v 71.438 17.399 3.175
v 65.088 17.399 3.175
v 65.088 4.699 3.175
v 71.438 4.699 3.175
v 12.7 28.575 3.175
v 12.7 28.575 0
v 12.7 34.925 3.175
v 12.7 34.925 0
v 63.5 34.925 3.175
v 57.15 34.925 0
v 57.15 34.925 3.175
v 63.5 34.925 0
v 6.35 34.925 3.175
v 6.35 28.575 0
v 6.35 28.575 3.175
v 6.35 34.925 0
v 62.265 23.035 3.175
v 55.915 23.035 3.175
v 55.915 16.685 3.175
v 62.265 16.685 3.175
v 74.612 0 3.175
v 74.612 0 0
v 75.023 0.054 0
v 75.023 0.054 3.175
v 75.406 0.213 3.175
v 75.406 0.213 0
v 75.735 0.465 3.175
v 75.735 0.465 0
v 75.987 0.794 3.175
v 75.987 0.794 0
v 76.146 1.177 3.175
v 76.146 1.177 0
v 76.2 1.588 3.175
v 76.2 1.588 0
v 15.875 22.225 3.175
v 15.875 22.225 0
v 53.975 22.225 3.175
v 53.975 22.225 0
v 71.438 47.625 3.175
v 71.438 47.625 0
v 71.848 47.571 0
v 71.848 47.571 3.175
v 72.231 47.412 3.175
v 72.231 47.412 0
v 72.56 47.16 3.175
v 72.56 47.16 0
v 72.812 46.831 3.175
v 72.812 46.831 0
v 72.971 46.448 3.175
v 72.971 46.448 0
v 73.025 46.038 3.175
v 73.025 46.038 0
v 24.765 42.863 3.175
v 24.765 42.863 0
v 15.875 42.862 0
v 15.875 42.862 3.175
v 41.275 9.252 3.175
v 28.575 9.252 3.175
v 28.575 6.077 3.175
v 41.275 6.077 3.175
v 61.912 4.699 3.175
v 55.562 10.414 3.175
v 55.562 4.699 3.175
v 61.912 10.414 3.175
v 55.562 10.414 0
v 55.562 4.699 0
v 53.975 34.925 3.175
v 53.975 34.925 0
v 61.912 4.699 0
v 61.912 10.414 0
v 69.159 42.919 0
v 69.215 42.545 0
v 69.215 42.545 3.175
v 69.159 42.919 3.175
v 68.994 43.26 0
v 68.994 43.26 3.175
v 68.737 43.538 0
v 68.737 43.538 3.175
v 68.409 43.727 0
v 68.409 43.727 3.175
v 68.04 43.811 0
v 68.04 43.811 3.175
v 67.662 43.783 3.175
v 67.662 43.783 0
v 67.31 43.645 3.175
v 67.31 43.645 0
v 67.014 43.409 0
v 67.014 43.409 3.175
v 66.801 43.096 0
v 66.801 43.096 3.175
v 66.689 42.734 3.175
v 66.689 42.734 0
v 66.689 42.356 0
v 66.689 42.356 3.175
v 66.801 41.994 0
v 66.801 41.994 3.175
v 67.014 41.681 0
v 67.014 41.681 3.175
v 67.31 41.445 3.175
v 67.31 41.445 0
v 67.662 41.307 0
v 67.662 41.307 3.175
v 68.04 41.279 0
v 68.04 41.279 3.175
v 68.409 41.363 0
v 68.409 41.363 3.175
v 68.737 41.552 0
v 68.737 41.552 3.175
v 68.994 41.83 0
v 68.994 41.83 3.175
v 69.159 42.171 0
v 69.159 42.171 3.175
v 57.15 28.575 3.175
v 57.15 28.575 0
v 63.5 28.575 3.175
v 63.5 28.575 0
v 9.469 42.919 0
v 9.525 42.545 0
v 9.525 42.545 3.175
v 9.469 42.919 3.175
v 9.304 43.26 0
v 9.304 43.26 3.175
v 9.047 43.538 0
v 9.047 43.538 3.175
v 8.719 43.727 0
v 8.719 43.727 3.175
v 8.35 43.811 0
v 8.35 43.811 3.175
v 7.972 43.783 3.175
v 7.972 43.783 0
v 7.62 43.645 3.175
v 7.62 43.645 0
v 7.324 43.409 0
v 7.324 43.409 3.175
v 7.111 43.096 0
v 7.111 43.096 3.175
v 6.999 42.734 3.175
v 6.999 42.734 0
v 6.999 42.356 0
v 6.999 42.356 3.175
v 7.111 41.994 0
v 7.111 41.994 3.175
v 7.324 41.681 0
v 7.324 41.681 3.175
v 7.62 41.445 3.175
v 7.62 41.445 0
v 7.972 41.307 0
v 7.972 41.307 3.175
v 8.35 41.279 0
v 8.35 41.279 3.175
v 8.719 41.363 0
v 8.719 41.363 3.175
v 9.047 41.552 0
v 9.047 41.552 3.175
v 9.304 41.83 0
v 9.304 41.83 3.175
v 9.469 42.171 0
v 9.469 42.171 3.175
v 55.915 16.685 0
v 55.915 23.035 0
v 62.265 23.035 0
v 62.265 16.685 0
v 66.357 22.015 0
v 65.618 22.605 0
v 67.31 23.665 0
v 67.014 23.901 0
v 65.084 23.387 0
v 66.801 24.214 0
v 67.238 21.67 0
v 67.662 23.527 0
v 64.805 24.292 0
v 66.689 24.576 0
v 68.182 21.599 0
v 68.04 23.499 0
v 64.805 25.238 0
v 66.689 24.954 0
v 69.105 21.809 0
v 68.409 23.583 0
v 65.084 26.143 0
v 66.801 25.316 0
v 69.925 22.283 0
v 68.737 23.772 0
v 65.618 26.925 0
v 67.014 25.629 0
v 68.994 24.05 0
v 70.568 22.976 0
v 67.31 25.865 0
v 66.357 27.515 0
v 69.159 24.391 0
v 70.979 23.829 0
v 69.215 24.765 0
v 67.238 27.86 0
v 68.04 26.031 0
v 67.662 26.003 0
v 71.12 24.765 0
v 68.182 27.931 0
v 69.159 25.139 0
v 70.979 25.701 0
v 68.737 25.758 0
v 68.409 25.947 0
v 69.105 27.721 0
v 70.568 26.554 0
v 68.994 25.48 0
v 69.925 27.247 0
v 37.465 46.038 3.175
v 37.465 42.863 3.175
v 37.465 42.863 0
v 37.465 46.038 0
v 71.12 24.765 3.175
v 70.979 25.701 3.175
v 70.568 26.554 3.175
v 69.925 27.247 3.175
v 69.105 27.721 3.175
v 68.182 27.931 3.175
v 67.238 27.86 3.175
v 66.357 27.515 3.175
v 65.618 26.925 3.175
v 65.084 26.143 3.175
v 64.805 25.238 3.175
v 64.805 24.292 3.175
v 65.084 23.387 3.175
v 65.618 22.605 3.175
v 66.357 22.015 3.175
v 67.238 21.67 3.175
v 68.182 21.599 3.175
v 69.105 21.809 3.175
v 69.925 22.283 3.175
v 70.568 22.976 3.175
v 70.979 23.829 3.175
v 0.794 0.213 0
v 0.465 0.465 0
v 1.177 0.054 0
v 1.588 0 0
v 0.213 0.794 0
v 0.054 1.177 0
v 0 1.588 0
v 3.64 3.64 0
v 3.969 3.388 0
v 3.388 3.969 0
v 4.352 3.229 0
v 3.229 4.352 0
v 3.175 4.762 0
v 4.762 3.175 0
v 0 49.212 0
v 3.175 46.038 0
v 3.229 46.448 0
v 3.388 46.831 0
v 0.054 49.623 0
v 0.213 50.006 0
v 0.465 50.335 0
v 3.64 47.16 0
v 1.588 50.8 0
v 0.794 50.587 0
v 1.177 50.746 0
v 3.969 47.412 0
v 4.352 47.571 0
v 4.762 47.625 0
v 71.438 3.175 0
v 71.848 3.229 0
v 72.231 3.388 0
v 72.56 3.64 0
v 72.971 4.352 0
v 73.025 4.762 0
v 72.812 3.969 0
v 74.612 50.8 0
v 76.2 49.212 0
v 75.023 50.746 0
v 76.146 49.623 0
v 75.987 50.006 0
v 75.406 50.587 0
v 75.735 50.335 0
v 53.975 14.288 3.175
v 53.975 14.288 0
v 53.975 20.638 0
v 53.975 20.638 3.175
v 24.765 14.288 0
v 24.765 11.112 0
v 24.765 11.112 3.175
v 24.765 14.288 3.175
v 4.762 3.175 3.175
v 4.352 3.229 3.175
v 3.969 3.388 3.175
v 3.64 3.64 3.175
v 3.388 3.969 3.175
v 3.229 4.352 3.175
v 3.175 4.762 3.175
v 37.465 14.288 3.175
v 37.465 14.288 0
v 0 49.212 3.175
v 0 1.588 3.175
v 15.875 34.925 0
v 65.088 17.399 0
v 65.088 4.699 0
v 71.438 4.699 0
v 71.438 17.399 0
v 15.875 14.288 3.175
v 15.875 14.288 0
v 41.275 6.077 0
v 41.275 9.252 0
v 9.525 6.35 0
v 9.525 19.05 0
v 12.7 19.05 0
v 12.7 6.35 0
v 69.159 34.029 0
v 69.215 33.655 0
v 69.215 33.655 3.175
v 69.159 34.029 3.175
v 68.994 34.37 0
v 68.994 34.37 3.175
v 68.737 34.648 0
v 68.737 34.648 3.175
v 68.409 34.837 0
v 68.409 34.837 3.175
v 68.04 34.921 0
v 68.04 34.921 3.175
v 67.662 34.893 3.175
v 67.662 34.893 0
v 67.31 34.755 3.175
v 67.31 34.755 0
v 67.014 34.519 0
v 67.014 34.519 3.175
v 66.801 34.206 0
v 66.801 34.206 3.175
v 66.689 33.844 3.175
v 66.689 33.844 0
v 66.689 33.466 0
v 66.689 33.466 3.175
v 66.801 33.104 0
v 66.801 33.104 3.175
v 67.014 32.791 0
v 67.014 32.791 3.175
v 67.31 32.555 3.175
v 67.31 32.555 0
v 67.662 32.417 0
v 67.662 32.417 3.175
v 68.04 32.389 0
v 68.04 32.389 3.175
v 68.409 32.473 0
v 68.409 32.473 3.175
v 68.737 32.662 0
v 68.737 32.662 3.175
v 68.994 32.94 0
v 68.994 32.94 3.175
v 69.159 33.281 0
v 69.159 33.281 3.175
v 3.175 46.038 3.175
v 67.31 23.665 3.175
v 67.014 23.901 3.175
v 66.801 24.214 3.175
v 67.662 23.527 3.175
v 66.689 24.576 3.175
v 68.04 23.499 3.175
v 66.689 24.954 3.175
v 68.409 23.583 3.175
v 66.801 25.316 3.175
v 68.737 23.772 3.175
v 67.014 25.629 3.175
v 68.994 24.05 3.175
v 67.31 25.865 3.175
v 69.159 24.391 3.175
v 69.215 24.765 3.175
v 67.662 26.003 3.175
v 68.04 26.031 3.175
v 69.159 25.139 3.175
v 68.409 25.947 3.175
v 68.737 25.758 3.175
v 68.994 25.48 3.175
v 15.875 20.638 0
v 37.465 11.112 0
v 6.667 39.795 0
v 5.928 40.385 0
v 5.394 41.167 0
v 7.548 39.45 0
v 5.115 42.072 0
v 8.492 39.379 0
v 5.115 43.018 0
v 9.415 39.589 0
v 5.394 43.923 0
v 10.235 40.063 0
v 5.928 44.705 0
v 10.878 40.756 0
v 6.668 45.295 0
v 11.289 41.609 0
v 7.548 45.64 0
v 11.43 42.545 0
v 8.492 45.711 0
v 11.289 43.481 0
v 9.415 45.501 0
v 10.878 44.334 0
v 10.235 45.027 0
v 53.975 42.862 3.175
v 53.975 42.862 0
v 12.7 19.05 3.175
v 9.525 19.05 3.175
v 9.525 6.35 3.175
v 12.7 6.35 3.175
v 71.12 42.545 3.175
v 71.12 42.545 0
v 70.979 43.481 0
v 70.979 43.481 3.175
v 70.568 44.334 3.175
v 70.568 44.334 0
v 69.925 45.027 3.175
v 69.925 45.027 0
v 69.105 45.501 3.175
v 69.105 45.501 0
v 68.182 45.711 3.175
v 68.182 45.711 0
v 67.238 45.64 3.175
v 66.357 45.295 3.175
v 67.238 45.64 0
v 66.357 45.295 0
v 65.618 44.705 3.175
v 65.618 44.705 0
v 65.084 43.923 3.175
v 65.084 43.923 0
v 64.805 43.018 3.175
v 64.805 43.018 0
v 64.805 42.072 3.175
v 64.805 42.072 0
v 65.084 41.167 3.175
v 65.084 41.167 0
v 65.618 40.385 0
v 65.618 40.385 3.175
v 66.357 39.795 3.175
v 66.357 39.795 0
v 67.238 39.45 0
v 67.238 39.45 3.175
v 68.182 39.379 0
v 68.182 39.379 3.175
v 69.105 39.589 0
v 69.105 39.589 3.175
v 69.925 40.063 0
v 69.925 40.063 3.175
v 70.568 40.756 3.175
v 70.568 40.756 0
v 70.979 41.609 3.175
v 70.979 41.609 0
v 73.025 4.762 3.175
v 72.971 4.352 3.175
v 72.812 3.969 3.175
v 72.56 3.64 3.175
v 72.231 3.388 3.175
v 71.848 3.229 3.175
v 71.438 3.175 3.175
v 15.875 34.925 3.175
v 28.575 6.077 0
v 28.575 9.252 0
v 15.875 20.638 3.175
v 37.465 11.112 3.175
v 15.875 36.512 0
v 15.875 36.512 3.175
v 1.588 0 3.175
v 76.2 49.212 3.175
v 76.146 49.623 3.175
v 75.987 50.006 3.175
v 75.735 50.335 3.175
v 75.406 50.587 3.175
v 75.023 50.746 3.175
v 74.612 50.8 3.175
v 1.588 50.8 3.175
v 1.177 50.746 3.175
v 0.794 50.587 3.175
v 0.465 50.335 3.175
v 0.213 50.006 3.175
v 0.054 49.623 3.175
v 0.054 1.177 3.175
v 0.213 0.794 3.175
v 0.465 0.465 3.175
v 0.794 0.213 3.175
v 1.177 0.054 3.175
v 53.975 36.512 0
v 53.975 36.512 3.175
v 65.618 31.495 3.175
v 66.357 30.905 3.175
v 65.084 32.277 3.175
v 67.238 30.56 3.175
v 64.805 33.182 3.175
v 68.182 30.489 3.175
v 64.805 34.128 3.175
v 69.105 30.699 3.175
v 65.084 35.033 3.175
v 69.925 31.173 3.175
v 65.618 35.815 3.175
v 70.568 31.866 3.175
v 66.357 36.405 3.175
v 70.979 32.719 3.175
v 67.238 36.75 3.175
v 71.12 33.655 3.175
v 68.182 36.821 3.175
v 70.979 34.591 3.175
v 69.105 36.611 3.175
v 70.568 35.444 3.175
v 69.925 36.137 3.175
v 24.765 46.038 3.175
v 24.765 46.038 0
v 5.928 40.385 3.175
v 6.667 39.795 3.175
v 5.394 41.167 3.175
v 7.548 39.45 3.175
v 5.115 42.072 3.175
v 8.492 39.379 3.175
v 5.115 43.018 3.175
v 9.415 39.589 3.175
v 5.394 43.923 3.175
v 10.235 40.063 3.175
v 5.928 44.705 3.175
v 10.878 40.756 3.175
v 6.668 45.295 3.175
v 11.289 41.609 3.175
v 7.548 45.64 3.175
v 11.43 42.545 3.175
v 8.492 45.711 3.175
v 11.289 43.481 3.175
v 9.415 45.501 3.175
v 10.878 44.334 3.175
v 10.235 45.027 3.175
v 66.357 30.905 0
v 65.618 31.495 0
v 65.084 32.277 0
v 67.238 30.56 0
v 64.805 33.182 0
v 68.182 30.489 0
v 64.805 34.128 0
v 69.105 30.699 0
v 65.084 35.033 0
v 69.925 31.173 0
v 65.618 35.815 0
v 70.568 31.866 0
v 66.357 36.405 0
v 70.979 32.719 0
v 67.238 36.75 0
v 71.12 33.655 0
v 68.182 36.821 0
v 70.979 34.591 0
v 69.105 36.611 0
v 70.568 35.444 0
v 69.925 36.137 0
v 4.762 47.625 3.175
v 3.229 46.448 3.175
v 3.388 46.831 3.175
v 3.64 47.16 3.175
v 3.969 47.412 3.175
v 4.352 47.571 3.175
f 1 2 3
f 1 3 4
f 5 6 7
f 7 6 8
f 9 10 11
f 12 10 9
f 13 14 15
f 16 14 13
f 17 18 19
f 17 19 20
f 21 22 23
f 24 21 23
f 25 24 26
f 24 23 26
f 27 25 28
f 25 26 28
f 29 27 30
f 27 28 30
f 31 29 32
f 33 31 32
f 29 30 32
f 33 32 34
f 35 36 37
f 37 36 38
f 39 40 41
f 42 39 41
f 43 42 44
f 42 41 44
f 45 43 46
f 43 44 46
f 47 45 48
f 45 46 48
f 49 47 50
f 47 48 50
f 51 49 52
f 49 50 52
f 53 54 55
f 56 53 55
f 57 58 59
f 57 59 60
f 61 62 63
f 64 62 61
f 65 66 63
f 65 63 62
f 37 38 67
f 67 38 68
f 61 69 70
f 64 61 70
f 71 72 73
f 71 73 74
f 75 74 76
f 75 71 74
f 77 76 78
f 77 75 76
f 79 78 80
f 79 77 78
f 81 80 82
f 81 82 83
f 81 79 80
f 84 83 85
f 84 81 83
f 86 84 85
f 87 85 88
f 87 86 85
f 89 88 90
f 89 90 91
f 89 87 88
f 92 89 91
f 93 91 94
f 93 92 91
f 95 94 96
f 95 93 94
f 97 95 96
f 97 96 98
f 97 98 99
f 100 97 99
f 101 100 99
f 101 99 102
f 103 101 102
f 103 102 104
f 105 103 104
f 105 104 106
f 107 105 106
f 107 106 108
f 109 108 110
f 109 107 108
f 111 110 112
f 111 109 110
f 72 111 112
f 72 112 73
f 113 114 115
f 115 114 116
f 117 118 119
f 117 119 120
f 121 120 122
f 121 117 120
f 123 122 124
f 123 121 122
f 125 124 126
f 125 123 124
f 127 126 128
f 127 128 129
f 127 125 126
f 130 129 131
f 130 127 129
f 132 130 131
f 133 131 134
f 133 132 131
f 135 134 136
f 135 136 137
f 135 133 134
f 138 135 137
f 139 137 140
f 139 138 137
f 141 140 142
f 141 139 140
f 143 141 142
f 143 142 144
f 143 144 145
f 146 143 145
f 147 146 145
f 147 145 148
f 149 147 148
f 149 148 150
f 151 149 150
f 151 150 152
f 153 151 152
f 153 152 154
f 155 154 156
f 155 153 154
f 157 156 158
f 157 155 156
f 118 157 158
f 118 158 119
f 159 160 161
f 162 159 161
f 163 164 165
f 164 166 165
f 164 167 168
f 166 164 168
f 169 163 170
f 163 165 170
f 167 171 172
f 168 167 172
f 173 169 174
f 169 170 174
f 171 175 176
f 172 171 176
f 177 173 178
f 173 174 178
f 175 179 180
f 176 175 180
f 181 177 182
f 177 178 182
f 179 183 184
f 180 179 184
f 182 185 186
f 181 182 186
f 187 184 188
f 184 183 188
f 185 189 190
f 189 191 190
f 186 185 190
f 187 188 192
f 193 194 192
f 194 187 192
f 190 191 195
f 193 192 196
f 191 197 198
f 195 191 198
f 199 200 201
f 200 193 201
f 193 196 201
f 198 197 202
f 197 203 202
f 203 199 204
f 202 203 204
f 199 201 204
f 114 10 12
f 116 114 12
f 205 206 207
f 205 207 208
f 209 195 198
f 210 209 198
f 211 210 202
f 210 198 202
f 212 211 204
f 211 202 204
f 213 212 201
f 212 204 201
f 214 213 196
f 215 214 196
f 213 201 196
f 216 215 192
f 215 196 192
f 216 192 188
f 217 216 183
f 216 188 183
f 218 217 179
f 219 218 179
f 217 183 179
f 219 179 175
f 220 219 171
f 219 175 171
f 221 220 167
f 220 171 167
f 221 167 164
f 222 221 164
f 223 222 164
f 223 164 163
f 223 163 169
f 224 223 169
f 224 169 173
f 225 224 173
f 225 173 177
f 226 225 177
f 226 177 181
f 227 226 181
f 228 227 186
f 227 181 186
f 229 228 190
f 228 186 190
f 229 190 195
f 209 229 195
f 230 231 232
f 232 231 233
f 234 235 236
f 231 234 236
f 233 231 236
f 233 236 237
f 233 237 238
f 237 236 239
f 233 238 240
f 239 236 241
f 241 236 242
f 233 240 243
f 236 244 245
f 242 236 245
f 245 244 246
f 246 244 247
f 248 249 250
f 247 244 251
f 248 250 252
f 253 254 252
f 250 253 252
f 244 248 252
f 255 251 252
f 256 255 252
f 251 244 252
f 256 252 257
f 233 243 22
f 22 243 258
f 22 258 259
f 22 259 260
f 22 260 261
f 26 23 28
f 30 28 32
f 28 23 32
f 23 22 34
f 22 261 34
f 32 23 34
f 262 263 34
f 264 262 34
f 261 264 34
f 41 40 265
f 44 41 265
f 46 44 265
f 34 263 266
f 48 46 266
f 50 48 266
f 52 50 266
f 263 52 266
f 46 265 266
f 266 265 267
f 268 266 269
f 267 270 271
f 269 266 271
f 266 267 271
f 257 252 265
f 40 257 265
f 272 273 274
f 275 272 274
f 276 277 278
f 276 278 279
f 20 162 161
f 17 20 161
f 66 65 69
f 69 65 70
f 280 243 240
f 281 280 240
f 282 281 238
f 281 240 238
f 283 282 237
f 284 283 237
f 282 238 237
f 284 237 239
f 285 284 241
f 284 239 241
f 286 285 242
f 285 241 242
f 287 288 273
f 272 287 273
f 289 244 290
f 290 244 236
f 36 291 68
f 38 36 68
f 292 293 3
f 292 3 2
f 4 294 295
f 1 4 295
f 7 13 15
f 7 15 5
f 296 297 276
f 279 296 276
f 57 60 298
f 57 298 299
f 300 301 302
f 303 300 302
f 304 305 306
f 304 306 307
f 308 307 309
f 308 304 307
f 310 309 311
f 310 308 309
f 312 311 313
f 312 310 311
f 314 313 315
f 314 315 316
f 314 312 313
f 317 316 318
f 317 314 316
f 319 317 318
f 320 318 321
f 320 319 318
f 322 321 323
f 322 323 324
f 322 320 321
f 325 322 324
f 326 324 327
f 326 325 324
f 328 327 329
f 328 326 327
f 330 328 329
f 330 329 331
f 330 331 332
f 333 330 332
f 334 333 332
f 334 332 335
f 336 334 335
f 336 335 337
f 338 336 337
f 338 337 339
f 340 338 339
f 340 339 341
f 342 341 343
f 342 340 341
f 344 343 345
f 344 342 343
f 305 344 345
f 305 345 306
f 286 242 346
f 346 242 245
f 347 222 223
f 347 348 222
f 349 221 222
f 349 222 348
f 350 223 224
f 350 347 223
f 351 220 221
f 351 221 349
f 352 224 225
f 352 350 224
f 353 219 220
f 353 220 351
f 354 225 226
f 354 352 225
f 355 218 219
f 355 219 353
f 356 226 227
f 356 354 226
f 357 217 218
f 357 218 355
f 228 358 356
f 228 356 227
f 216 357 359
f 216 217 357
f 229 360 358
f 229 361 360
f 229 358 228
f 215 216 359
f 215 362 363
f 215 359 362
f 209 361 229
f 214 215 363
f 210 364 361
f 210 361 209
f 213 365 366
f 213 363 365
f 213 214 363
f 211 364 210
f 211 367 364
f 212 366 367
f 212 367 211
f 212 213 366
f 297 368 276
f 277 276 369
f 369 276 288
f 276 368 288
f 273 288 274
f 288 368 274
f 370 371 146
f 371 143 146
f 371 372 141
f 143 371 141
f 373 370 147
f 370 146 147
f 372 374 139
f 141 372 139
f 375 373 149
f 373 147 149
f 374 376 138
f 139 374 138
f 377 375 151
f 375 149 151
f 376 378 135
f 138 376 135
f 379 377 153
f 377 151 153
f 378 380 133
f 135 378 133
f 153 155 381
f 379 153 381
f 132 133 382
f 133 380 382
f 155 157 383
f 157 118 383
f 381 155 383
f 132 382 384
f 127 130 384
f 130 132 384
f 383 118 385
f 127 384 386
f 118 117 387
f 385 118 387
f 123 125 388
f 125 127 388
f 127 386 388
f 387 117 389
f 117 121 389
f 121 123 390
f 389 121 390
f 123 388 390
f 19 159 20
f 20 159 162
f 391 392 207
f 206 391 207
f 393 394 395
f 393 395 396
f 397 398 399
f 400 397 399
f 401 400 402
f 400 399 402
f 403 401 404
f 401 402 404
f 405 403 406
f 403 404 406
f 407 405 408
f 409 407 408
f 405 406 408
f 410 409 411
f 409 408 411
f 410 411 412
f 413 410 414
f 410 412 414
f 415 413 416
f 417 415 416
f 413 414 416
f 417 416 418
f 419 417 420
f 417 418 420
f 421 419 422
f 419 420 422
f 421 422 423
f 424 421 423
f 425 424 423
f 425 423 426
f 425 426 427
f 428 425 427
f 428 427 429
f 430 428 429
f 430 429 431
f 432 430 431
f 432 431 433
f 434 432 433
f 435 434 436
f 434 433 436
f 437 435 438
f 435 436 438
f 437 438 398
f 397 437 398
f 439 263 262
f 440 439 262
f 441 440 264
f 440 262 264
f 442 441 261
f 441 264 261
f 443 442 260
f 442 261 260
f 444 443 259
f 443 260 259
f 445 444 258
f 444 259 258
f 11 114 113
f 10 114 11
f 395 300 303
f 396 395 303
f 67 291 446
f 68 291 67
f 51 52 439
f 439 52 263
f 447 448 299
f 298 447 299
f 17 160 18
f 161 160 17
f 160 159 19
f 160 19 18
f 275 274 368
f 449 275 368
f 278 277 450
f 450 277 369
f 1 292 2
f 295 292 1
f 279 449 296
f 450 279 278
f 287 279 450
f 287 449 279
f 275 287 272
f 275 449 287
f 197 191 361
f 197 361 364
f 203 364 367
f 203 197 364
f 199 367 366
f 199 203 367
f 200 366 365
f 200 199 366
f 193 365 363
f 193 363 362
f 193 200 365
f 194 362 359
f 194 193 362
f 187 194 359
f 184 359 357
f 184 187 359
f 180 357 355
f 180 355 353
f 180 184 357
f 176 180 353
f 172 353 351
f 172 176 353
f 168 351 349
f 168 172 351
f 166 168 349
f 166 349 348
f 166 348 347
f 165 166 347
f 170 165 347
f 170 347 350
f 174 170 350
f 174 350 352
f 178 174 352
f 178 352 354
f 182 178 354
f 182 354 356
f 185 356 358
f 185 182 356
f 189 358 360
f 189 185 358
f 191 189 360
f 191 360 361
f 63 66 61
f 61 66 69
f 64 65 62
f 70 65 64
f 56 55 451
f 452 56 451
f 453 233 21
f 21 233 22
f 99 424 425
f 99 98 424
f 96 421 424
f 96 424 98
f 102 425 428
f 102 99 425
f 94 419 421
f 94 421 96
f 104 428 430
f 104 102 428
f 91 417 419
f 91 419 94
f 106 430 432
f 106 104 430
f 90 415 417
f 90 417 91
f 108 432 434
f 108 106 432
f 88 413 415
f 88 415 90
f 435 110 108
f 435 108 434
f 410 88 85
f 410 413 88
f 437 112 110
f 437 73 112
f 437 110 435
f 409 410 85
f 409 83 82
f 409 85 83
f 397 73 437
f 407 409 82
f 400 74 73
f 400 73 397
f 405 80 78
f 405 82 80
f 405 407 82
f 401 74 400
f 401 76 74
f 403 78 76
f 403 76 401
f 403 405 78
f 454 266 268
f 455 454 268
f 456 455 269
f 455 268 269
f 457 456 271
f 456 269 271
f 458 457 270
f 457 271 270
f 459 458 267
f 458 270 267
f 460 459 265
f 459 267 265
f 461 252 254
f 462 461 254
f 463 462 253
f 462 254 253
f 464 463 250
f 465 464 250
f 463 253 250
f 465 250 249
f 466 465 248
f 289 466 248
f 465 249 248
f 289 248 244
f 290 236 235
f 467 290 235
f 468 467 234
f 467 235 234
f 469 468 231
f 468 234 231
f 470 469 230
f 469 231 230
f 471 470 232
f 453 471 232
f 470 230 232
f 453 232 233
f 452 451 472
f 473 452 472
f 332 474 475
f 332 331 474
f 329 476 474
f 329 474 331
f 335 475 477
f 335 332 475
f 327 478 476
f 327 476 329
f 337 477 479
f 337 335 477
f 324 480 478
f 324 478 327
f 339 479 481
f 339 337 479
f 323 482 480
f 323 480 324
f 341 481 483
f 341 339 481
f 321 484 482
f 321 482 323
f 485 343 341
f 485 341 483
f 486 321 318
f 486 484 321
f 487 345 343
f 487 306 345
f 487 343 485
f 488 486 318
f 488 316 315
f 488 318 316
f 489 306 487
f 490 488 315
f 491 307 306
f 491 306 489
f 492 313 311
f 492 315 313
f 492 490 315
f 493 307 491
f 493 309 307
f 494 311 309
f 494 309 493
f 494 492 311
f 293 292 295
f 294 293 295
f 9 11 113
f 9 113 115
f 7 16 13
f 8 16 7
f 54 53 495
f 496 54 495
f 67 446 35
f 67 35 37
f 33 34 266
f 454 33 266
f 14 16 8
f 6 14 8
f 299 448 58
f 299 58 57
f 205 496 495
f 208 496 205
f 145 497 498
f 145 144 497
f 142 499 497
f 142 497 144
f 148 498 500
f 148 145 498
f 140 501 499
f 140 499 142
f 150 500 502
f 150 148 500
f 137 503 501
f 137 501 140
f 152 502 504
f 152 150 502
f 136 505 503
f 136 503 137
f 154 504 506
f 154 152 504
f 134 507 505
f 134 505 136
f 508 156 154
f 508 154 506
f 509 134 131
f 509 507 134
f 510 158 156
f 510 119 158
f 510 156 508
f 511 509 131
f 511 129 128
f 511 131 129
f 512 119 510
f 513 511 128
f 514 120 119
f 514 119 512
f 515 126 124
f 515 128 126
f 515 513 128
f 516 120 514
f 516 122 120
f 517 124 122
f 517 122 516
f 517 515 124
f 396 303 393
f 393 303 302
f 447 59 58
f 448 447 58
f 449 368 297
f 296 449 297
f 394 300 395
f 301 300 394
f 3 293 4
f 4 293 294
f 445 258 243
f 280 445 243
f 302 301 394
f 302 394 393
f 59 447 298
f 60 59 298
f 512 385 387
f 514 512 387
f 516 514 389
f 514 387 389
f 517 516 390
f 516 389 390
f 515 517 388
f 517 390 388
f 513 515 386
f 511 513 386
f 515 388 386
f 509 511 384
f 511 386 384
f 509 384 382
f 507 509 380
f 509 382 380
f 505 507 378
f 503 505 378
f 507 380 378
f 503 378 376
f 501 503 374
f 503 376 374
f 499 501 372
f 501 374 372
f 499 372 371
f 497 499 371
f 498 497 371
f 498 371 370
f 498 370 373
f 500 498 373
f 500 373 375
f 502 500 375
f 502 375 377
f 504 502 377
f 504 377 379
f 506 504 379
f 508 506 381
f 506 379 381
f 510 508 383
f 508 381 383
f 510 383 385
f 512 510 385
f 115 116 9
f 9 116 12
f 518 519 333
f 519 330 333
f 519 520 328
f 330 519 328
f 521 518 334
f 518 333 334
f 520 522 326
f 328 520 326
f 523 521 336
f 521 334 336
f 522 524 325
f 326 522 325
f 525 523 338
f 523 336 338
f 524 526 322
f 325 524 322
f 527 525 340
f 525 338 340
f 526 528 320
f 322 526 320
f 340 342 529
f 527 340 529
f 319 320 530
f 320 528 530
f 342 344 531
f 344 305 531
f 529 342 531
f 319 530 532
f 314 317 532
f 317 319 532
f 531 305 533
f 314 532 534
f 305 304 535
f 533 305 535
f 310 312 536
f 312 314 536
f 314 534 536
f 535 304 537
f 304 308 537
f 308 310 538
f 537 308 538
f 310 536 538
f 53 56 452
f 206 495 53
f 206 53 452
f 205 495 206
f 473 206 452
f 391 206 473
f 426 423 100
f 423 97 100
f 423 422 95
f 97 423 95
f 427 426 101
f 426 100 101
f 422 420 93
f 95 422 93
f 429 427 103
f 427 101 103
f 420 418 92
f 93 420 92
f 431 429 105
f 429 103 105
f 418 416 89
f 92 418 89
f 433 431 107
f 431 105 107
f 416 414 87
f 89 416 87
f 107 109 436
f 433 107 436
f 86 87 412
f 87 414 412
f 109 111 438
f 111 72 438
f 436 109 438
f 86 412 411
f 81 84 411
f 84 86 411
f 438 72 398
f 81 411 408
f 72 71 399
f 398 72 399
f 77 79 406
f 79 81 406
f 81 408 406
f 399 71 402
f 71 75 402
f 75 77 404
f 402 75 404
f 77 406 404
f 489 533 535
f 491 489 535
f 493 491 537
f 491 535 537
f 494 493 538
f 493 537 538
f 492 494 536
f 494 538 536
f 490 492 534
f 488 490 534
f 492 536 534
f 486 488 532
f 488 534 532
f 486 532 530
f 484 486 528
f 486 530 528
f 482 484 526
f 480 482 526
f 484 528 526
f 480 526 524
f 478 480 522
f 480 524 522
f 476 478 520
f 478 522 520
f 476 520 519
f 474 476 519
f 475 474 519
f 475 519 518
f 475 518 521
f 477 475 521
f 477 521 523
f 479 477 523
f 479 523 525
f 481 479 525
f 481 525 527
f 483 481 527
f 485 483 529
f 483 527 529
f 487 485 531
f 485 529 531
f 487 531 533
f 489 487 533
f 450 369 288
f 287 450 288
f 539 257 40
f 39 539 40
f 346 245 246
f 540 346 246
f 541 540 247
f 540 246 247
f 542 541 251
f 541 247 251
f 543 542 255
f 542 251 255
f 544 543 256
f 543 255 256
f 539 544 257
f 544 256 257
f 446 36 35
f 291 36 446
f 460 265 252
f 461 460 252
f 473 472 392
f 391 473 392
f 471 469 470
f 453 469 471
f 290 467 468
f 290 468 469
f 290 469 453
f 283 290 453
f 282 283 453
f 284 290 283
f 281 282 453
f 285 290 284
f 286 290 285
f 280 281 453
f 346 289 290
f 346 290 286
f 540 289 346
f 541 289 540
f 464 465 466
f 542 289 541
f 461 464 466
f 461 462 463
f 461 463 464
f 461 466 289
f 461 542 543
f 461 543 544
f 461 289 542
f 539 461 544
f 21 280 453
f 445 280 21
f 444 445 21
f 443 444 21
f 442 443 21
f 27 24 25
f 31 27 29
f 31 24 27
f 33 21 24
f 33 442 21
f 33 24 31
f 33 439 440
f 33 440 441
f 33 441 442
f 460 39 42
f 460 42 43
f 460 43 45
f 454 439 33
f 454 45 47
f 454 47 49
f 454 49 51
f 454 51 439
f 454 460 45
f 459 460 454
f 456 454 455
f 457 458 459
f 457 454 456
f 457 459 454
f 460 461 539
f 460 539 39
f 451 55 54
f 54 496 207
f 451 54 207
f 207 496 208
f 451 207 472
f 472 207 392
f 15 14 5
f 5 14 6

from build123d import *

# Parameters (mm, degrees)
F1_DEPTH = 3.175
F2_R     = 3.175
F2_R_2   = 1.27
F3_DEPTH = 3.175
F4_W     = 38.1
F4_H     = 12.7
F4_W_2   = 6.35
F4_H_2   = 6.35
F5_DEPTH = 3.175
F6_W     = 12.7
F6_H     = 3.175
F6_W_2   = 6.35
F6_H_2   = 12.7
F6_H_3   = 5.715
F6_H_4   = 6.35
F7_DEPTH = 3.175
F8_W     = 3.175
F8_H     = 12.7
F8_W_2   = 12.7
F8_H_2   = 3.175
F9_DEPTH = 3.175


with BuildPart() as f1:
    # F0 (on Top) → F1 (new body)
    with BuildSketch(Plane.XY):
        with BuildLine():
            ThreePointArc((0, 1.5875), (0.464968, 0.464968), (1.5875, 0))
            Line((1.5875, 0), (74.6125, 0))
            ThreePointArc((74.6125, 0), (75.735032, 0.464968), (76.2, 1.5875))
            Line((76.2, 1.5875), (76.2, 49.2125))
            ThreePointArc((76.2, 49.2125), (75.735032, 50.335032), (74.6125, 50.8))
            Line((74.6125, 50.8), (1.5875, 50.8))
            ThreePointArc((1.5875, 50.8), (0.464968, 50.335032), (0, 49.2125))
            Line((0, 49.2125), (0, 1.5875))
        make_face()
        with BuildLine():
            Line((73.025, 46.0375), (73.025, 4.7625))
            ThreePointArc((73.025, 4.7625), (72.560032, 3.639968), (71.4375, 3.175))
            Line((71.4375, 3.175), (4.7625, 3.175))
            ThreePointArc((4.7625, 3.175), (3.639968, 3.639968), (3.175, 4.7625))
            Line((3.175, 4.7625), (3.175, 46.0375))
            ThreePointArc((3.175, 46.0375), (3.639968, 47.160032), (4.7625, 47.625))
            Line((4.7625, 47.625), (71.4375, 47.625))
            ThreePointArc((71.4375, 47.625), (72.560032, 47.160032), (73.025, 46.0375))
        make_face(mode=Mode.SUBTRACT)
    extrude(amount=F1_DEPTH)


with BuildPart() as f3:
    # F2 (on Top) → F3 (new body)
    with BuildSketch(Plane.XY):
        with Locations((67.945, 24.765)):
            Circle(F2_R)
        with Locations((67.945, 24.765)):
            Circle(F2_R_2, mode=Mode.SUBTRACT)
        with Locations((8.255, 42.545)):
            Circle(F2_R)
        with Locations((8.255, 42.545)):
            Circle(F2_R_2, mode=Mode.SUBTRACT)
        with Locations((67.945, 42.545)):
            Circle(F2_R)
        with Locations((67.945, 42.545)):
            Circle(F2_R_2, mode=Mode.SUBTRACT)
        with Locations((67.945, 33.655)):
            Circle(F2_R)
        with Locations((67.945, 33.655)):
            Circle(F2_R_2, mode=Mode.SUBTRACT)
    extrude(amount=F3_DEPTH)


with BuildPart() as f5:
    # F4 (on Top) → F5 (new body)
    with BuildSketch(Plane.XY):
        with Locations((34.925, 28.575)):
            Rectangle(F4_W, F4_H)
        with Locations((9.525, 31.75)):
            Rectangle(F4_W_2, F4_H_2)
        with Locations((60.325, 31.75)):
            Rectangle(F4_W_2, F4_H_2)
    extrude(amount=F5_DEPTH)


with BuildPart() as f7:
    # F6 (on Top) → F7 (new body)
    with BuildSketch(Plane.XY):
        Polygon((53.975, 20.6375), (15.875, 20.6375), (15.875, 14.2875), (24.765, 14.2875), (37.465, 14.2875), (53.975, 14.2875), align=None)
        with Locations((31.115, 12.7)):
            Rectangle(F6_W, F6_H)
        Polygon((15.875, 42.8625), (15.875, 36.5125), (53.975, 36.5125), (53.975, 42.8625), (37.465, 42.8625), (24.765, 42.8625), align=None)
        with Locations((31.115, 44.45)):
            Rectangle(F6_W, F6_H)
        with Locations((68.2625, 11.049)):
            Rectangle(F6_W_2, F6_H_2)
        with Locations((58.7375, 7.5565)):
            Rectangle(F6_W_2, F6_H_3)
        with Locations((59.089927, 19.859561)):
            Rectangle(F6_W_2, F6_H_4)
    extrude(amount=F7_DEPTH)


with BuildPart() as f9:
    # F8 (on Top) → F9 (new body)
    with BuildSketch(Plane.XY):
        with Locations((11.1125, 12.7)):
            Rectangle(F8_W, F8_H)
        with Locations((34.925, 7.664609)):
            Rectangle(F8_W_2, F8_H_2)
    extrude(amount=F9_DEPTH)


solid = Compound([f1.part, f3.part, f5.part, f7.part, f9.part])
